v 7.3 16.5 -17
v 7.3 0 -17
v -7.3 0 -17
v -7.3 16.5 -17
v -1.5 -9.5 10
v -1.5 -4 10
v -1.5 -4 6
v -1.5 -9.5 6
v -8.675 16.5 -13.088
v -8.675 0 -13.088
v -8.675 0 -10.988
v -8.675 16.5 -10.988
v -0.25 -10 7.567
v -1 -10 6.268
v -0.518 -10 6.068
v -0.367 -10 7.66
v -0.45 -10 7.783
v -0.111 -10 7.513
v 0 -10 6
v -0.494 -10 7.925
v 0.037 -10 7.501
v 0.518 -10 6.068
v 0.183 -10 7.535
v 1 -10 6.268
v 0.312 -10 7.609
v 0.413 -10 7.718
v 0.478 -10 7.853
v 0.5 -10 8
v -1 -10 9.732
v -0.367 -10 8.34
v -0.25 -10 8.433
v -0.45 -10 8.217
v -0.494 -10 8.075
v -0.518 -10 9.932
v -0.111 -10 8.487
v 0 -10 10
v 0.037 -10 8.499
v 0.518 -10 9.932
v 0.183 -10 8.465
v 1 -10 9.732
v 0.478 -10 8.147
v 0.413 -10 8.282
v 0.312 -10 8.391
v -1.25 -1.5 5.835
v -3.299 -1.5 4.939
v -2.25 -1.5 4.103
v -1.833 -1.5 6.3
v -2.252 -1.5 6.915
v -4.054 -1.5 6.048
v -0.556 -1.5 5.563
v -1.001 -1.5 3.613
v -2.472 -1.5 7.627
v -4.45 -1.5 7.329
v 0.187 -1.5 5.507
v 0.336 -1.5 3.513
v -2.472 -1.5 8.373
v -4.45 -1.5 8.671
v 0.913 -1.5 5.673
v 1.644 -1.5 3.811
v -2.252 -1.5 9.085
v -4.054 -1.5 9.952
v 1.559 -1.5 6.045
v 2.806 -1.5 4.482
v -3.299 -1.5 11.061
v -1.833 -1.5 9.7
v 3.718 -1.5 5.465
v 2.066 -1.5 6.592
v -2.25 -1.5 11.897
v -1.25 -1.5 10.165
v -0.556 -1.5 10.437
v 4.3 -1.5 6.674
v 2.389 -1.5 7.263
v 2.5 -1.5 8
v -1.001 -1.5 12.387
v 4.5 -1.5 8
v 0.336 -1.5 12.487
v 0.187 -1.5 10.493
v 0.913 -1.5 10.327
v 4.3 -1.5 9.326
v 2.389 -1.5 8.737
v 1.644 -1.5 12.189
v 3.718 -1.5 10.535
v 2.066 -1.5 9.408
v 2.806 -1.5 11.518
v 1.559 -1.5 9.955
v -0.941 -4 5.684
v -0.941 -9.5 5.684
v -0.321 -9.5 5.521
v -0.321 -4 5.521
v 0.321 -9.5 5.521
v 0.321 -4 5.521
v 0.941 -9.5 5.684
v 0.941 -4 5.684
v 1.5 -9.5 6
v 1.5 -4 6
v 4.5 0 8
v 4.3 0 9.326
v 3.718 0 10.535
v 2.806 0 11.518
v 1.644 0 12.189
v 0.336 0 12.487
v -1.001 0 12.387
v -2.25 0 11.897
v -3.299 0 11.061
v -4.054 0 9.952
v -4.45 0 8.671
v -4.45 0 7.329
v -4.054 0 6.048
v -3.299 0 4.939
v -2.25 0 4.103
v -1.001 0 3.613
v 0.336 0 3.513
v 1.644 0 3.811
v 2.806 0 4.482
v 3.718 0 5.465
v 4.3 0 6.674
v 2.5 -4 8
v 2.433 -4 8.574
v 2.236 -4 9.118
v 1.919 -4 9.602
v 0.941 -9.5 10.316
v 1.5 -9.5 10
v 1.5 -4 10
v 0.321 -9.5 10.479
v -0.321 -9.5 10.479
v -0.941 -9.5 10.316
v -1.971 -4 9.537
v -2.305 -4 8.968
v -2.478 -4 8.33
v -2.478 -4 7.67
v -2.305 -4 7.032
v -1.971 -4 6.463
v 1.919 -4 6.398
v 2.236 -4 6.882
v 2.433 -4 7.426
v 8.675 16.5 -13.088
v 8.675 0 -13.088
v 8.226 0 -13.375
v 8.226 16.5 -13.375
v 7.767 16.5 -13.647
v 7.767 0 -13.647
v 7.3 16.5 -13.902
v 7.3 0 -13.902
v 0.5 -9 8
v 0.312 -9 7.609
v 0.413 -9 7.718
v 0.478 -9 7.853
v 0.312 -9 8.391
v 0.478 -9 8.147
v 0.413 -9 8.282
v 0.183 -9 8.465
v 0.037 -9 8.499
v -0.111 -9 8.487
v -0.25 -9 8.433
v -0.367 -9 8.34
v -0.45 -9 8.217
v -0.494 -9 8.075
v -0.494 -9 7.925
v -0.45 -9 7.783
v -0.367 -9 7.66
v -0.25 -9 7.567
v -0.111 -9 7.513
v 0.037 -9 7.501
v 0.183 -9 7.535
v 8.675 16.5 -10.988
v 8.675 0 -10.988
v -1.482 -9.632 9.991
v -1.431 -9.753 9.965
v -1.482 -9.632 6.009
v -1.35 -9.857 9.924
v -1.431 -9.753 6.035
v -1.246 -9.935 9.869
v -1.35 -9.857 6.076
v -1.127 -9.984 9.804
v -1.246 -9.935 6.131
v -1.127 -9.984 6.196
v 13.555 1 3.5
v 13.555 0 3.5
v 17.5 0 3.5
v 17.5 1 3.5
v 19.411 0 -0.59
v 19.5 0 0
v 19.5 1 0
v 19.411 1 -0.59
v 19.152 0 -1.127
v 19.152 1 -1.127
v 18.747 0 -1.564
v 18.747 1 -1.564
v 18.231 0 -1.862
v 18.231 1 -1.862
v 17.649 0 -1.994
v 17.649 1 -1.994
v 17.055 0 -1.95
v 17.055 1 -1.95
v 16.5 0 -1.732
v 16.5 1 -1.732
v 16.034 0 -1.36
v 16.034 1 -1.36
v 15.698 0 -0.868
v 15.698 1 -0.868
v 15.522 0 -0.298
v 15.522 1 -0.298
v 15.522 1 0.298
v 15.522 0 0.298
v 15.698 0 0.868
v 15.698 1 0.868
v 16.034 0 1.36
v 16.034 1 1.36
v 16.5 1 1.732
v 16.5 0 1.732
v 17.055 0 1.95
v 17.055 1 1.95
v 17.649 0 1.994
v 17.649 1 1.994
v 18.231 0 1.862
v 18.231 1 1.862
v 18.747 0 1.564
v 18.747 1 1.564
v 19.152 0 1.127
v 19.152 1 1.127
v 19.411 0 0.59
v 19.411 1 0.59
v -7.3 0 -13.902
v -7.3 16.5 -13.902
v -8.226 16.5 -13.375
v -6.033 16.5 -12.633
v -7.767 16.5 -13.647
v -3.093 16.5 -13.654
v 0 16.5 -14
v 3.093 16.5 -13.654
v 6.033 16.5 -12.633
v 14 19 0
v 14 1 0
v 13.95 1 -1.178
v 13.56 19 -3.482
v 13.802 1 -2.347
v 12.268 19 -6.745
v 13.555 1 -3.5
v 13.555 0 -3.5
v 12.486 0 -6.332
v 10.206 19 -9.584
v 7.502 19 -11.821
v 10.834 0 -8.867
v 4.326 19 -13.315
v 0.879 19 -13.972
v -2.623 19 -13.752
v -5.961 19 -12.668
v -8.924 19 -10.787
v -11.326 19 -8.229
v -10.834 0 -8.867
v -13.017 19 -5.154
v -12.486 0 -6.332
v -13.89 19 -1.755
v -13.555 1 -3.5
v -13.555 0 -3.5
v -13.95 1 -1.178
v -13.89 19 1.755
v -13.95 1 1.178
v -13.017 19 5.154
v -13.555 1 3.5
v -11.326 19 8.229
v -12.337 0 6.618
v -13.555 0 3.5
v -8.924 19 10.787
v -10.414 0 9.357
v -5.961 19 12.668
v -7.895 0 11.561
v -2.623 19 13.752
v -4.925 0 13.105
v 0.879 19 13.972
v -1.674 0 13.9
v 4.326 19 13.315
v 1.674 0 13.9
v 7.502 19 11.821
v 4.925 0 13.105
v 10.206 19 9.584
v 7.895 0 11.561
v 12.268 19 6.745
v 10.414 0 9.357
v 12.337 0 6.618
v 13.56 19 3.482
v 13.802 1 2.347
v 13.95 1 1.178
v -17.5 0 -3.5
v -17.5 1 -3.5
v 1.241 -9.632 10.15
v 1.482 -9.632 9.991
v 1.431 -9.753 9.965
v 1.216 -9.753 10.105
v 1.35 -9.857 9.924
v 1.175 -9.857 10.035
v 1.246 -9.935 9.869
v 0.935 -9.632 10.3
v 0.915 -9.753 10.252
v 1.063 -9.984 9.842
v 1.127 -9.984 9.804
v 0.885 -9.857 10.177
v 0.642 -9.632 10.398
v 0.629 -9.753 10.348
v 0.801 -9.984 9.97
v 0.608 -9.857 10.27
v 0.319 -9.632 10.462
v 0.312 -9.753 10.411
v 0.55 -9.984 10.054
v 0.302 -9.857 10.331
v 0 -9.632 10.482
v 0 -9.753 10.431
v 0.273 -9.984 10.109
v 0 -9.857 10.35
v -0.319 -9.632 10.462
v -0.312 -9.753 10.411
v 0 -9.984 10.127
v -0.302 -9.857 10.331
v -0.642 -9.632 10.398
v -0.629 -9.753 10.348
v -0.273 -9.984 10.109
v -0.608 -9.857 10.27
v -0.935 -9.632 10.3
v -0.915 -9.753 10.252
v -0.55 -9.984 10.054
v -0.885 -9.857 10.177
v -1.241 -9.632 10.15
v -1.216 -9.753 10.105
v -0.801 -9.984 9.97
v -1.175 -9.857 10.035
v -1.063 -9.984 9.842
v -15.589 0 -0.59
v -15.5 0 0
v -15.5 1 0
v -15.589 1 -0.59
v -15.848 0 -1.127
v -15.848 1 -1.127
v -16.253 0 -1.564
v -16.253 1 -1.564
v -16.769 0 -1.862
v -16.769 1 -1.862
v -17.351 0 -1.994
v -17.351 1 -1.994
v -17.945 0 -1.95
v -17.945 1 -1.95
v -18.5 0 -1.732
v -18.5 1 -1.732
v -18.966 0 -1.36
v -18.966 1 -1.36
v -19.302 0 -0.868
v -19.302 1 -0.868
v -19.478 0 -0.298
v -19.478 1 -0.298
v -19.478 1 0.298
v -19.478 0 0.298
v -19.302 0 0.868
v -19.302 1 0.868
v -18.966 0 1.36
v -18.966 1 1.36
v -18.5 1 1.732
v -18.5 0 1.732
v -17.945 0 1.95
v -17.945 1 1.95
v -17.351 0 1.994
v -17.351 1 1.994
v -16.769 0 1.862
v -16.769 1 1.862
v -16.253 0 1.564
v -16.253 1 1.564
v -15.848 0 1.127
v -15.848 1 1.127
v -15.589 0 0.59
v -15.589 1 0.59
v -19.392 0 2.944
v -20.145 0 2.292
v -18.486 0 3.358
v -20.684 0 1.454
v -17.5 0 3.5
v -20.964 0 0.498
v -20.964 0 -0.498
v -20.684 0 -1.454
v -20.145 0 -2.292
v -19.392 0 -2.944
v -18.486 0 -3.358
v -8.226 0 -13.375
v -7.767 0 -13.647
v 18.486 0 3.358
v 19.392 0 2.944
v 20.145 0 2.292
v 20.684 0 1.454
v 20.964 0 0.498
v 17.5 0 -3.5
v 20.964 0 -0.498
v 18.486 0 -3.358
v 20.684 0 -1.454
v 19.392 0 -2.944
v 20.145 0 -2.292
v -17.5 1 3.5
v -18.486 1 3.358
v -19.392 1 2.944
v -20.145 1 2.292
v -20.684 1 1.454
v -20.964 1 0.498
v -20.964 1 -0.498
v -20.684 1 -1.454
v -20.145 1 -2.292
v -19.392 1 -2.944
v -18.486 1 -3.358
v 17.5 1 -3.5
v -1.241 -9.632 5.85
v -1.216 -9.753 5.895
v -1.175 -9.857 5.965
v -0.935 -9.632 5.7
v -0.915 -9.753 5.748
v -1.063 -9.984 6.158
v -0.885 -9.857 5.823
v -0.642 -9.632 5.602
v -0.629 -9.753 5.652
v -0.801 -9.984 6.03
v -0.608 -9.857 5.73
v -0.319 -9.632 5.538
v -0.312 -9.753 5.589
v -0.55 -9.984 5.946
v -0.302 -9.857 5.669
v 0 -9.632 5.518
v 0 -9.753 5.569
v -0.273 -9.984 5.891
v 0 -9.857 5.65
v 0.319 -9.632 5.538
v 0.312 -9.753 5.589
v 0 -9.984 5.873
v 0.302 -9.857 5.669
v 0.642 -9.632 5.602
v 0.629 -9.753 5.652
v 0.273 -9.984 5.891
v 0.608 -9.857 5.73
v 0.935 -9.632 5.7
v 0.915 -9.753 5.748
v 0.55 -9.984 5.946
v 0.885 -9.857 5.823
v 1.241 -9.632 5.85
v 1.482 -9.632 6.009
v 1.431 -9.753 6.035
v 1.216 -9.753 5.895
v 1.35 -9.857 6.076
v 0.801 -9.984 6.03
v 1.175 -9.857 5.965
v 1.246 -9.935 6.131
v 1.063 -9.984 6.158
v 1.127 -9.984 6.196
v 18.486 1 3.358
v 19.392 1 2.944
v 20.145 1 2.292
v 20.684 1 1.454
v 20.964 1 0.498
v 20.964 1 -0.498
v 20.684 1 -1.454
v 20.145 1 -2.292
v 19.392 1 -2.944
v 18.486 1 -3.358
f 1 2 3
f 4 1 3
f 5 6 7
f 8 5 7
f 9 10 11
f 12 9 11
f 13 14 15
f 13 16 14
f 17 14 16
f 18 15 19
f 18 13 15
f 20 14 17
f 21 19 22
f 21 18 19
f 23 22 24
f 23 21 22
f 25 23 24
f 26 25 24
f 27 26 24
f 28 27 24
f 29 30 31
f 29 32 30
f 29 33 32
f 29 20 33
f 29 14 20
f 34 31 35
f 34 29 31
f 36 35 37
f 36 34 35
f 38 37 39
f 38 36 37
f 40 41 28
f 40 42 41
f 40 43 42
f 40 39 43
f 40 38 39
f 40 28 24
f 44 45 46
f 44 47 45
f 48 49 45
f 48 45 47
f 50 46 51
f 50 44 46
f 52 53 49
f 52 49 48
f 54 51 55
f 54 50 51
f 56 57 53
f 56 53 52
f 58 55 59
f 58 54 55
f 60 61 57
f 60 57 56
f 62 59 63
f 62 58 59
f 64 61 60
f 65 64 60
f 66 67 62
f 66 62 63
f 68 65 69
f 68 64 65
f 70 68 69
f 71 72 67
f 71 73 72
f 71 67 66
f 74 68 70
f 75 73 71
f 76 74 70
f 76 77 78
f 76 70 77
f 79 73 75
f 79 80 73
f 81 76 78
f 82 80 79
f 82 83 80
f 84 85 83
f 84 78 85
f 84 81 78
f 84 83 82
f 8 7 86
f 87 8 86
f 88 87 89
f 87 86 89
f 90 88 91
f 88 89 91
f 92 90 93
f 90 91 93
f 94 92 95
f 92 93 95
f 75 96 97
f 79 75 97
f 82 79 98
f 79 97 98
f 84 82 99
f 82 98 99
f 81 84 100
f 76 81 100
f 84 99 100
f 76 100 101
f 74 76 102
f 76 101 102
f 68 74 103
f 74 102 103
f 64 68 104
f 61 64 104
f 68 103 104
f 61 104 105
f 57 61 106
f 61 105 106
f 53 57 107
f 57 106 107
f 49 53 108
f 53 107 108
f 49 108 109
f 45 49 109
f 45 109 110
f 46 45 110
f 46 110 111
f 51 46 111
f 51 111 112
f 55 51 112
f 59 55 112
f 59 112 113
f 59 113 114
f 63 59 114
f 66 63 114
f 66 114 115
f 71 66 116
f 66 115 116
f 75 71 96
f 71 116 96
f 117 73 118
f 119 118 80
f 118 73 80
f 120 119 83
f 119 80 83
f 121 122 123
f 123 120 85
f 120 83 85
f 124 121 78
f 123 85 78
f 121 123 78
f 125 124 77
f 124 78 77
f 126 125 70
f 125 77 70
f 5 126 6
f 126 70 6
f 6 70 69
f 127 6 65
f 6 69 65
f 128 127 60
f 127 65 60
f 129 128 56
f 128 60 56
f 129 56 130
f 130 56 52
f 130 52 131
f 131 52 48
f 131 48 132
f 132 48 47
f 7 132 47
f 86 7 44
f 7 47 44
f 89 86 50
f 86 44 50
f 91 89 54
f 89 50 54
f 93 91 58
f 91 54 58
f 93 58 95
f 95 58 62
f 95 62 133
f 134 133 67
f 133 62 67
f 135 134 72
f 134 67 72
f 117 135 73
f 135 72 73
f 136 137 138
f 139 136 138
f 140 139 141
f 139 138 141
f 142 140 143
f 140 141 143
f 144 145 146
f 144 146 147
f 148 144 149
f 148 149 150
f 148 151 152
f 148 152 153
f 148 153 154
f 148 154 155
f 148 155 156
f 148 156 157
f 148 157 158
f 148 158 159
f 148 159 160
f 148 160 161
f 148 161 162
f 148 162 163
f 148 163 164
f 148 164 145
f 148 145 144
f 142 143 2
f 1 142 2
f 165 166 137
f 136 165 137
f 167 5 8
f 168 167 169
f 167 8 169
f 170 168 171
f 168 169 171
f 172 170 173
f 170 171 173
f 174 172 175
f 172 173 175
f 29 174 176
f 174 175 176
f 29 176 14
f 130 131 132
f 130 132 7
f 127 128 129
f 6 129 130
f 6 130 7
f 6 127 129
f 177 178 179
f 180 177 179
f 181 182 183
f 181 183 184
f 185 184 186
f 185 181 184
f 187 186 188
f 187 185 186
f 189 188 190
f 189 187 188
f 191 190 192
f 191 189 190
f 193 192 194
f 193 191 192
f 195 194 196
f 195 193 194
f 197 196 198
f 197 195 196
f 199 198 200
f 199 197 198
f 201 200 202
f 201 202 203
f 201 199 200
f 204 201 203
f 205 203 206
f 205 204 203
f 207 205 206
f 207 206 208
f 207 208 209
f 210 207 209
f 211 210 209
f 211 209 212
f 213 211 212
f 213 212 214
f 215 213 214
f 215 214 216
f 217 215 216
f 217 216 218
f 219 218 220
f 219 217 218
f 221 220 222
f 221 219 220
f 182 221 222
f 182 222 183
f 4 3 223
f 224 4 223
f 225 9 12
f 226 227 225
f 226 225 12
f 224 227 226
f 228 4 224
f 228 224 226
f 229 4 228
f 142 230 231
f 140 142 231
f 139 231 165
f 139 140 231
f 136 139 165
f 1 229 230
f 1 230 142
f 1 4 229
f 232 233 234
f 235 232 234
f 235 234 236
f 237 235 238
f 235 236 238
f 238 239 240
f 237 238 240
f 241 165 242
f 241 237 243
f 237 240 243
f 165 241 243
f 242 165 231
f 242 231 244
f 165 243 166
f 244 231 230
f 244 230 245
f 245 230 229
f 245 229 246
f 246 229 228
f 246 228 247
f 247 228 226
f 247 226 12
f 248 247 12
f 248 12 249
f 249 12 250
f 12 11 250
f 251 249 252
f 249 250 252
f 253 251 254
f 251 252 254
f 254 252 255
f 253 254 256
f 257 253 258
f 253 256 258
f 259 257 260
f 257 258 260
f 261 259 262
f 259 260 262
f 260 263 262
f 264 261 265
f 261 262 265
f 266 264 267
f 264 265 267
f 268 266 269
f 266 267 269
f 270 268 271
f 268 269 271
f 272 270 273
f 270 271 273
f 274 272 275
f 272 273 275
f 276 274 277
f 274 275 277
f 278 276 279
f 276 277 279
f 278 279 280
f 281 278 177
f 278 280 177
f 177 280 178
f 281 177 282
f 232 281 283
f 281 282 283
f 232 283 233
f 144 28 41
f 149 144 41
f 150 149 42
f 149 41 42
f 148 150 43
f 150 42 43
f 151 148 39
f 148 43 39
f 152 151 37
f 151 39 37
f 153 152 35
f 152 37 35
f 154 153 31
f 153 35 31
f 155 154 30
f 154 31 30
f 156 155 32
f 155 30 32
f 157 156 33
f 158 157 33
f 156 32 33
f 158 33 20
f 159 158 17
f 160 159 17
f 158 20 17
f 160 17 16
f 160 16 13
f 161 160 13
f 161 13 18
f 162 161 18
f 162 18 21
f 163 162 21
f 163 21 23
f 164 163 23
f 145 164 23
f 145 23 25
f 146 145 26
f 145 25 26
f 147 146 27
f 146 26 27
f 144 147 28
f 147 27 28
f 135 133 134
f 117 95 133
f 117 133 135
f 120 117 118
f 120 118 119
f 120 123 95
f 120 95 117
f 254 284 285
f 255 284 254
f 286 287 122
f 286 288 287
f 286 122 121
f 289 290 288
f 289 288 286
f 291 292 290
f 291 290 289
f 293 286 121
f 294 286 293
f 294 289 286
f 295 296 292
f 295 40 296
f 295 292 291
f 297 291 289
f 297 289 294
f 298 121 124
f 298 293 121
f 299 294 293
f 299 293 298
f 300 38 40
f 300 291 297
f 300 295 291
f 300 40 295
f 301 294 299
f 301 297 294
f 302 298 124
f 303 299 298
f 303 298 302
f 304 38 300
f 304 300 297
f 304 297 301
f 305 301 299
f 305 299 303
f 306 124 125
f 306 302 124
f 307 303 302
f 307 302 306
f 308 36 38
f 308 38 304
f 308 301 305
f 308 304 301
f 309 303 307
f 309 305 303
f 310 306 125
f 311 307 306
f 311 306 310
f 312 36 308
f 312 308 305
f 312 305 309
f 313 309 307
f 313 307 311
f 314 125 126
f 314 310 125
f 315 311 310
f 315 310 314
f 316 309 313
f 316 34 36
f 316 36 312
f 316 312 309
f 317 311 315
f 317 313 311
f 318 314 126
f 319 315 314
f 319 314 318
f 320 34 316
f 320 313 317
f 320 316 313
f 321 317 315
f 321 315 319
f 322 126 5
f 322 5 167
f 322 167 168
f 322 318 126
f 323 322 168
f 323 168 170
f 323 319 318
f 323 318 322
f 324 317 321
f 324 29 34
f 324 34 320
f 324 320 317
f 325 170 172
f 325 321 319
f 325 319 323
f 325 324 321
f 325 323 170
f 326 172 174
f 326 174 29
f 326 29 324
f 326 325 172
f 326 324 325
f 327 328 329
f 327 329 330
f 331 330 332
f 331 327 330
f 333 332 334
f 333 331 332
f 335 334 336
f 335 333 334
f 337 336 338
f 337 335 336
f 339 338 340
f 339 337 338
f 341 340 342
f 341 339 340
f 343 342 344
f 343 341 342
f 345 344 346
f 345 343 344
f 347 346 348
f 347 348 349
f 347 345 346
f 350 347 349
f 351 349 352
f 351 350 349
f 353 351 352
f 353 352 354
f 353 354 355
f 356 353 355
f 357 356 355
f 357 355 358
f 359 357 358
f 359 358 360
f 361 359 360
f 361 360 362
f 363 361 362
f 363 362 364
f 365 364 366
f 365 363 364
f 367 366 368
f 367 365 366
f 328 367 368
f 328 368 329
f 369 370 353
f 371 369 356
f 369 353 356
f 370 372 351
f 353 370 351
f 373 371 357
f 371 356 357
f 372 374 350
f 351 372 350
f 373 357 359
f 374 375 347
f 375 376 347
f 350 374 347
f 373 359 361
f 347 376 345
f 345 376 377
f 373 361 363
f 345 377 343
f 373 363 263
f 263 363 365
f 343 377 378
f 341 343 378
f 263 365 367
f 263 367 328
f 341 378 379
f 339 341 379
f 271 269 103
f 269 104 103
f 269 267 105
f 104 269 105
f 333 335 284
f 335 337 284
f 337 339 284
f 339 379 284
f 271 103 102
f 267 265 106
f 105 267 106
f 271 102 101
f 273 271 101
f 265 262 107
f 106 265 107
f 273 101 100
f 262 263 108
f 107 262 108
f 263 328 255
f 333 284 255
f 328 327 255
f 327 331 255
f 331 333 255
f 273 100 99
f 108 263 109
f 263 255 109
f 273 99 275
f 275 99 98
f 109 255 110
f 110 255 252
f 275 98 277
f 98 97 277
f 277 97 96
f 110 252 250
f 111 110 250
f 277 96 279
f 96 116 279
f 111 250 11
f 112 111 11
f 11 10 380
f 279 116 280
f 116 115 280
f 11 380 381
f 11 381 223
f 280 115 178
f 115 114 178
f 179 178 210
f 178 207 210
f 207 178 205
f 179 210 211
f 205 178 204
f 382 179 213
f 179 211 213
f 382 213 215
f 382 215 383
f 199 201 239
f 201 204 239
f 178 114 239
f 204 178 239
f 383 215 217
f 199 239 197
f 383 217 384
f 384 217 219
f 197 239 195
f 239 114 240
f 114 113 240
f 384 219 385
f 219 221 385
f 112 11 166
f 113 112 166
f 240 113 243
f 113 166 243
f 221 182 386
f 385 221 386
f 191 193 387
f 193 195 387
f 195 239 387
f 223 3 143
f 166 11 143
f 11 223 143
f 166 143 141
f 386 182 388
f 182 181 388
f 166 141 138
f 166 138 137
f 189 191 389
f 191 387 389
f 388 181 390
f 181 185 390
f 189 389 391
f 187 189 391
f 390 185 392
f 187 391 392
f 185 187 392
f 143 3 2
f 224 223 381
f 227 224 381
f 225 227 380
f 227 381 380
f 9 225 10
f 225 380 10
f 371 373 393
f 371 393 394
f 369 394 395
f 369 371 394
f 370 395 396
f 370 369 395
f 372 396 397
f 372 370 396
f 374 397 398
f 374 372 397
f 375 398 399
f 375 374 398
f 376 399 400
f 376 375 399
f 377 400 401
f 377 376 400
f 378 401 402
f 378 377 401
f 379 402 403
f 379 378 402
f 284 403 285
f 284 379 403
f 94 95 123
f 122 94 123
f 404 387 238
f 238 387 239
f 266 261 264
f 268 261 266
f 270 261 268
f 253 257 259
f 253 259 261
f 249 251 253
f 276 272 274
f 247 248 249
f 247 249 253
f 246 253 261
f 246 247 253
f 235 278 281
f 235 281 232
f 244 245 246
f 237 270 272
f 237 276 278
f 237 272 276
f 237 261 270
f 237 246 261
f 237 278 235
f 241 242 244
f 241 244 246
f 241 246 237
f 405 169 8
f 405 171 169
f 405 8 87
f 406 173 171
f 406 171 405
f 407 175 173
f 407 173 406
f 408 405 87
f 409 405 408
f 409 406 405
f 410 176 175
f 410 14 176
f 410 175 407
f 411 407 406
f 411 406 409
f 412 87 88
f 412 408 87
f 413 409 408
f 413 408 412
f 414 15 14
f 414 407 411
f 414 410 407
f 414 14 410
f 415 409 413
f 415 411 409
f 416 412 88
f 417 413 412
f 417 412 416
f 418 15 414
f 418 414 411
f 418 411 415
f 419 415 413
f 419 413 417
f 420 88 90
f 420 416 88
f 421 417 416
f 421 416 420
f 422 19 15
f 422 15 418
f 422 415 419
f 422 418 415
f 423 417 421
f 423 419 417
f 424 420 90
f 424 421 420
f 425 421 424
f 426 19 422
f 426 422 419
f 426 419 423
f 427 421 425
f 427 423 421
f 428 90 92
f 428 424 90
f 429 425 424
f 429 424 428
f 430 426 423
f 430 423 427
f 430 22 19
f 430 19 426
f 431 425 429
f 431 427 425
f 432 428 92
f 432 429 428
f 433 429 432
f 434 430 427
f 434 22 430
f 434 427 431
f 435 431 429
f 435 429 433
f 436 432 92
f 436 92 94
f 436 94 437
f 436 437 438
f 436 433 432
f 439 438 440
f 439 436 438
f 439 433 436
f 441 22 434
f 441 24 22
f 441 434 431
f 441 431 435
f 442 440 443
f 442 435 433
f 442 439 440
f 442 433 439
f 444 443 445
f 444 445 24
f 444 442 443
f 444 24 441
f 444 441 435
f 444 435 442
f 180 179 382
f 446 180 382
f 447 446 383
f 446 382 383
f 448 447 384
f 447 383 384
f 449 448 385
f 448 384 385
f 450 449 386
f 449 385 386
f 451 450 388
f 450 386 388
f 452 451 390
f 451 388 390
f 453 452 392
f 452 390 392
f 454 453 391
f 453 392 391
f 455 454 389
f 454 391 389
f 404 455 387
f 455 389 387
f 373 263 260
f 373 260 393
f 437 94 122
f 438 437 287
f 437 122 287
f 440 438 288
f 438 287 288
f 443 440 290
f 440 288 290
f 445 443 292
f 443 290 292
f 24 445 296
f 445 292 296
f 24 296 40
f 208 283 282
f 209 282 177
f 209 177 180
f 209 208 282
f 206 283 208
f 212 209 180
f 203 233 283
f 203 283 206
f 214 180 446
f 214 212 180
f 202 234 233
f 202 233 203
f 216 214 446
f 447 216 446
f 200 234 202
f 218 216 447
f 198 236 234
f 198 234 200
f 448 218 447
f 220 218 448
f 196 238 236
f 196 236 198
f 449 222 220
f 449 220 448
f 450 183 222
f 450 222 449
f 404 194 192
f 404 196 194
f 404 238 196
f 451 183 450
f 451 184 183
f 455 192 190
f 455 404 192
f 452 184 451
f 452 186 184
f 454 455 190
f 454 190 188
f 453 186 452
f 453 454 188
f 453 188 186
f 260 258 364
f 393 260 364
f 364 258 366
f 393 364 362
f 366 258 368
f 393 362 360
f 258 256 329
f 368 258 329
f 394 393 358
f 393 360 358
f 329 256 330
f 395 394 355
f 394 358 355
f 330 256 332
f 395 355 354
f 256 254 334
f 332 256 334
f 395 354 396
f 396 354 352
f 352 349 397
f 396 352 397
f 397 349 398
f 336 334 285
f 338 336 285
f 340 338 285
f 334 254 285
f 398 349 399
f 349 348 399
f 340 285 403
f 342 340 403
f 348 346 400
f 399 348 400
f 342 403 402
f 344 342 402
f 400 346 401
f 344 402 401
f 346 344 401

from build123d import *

# Parameters (mm, degrees)
SKETCH1_R           = 14
BOSS_EXTRUDE1_DEPTH = 19
BOSS_EXTRUDE2_DEPTH = 16.5
SKETCH3_R           = 2
BOSS_EXTRUDE3_DEPTH = 1
SKETCH4_R           = 4.5
BOSS_EXTRUDE4_DEPTH = 1.5
SKETCH5_R           = 2.5
BOSS_EXTRUDE5_DEPTH = 2.5
BOSS_EXTRUDE6_DEPTH = 6
FILLET1_R           = 0.5
SKETCH7_R           = 0.5
CUT_EXTRUDE1_DEPTH  = 1


with BuildPart() as part:
    # Sketch1 → Boss-Extrude1 (new body)
    with BuildSketch(Plane(origin=(0, 0, 0), x_dir=(1, 0, 0), z_dir=(0, 1, 0))):
        Circle(SKETCH1_R)
    extrude(amount=BOSS_EXTRUDE1_DEPTH)

    # Sketch2 → Boss-Extrude2 (add)
    with BuildSketch(Plane(origin=(0, 0, 0), x_dir=(1, 0, 0), z_dir=(0, 1, 0))):
        with BuildLine():
            Line((7.3, 17), (-7.3, 17))
            Line((-7.3, 17), (-7.3, 13.902200296))
            ThreePointArc((-7.3, 13.902200296), (-7.99785811, 13.51278797), (-8.675, 13.088374539))
            Line((-8.675, 13.088374539), (-8.675, 10.988374539))
            ThreePointArc((-8.675, 10.988374539), (0, 14), (8.675, 10.988374539))
            Line((8.675, 10.988374539), (8.675, 13.088374539))
            ThreePointArc((8.675, 13.088374539), (7.99785811, 13.51278797), (7.3, 13.902200296))
            Line((7.3, 13.902200296), (7.3, 17))
        make_face()
    extrude(amount=BOSS_EXTRUDE2_DEPTH)

    # Sketch3 → Boss-Extrude3 (add)
    with BuildSketch(Plane(origin=(0, 0, 0), x_dir=(1, 0, 0), z_dir=(0, 1, 0))):
        with BuildLine():
            Line((-17.5, 3.5), (-13.555441712, 3.5))
            ThreePointArc((-13.555441712, 3.5), (-14, 0), (-13.555441712, -3.5))
            Line((-13.555441712, -3.5), (-17.5, -3.5))
            ThreePointArc((-17.5, -3.5), (-21, 0), (-17.5, 3.5))
        make_face()
        with Locations((-17.5, 0)):
            Circle(SKETCH3_R, mode=Mode.SUBTRACT)
        with BuildLine():
            Line((17.5, 3.5), (13.555441712, 3.5))
            ThreePointArc((13.555441712, 3.5), (14, 0), (13.555441712, -3.5))
            Line((13.555441712, -3.5), (17.5, -3.5))
            ThreePointArc((17.5, -3.5), (21, 0), (17.5, 3.5))
        make_face()
        with Locations((17.5, 0)):
            Circle(SKETCH3_R, mode=Mode.SUBTRACT)
    extrude(amount=BOSS_EXTRUDE3_DEPTH)

    # Sketch4 → Boss-Extrude4 (add)
    with BuildSketch(Plane.XZ):
        with Locations((0, 8)):
            Circle(SKETCH4_R)
    extrude(amount=BOSS_EXTRUDE4_DEPTH)

    # Sketch5 → Boss-Extrude5 (add)
    with BuildSketch(Plane.XZ.offset(1.5)):
        with Locations((0, 8)):
            Circle(SKETCH5_R)
    extrude(amount=BOSS_EXTRUDE5_DEPTH)

    # Sketch6 → Boss-Extrude6 (add)
    with BuildSketch(Plane.XZ.offset(4)):
        with BuildLine():
            Line((-1.5, 10), (-1.5, 6))
            ThreePointArc((-1.5, 6), (0, 5.5), (1.5, 6))
            Line((1.5, 6), (1.5, 10))
            ThreePointArc((1.5, 10), (0, 10.5), (-1.5, 10))
        make_face()
    extrude(amount=BOSS_EXTRUDE6_DEPTH)

    # Fillet1
    fillet1_edges = [part.edges().sort_by_distance(p)[0] for p in [
        (0, -10, 10.5),
        (-1.5, -10, 8),
        (0, -10, 5.5),
        (1.5, -10, 8),
    ]]
    fillet(fillet1_edges, radius=FILLET1_R)

    # Sketch7 → Cut-Extrude1 (cut)
    with BuildSketch(Plane.XZ.offset(10)):
        with Locations((0, 8)):
            Circle(SKETCH7_R)
    extrude(amount=-CUT_EXTRUDE1_DEPTH, mode=Mode.SUBTRACT)


solid = part.part
